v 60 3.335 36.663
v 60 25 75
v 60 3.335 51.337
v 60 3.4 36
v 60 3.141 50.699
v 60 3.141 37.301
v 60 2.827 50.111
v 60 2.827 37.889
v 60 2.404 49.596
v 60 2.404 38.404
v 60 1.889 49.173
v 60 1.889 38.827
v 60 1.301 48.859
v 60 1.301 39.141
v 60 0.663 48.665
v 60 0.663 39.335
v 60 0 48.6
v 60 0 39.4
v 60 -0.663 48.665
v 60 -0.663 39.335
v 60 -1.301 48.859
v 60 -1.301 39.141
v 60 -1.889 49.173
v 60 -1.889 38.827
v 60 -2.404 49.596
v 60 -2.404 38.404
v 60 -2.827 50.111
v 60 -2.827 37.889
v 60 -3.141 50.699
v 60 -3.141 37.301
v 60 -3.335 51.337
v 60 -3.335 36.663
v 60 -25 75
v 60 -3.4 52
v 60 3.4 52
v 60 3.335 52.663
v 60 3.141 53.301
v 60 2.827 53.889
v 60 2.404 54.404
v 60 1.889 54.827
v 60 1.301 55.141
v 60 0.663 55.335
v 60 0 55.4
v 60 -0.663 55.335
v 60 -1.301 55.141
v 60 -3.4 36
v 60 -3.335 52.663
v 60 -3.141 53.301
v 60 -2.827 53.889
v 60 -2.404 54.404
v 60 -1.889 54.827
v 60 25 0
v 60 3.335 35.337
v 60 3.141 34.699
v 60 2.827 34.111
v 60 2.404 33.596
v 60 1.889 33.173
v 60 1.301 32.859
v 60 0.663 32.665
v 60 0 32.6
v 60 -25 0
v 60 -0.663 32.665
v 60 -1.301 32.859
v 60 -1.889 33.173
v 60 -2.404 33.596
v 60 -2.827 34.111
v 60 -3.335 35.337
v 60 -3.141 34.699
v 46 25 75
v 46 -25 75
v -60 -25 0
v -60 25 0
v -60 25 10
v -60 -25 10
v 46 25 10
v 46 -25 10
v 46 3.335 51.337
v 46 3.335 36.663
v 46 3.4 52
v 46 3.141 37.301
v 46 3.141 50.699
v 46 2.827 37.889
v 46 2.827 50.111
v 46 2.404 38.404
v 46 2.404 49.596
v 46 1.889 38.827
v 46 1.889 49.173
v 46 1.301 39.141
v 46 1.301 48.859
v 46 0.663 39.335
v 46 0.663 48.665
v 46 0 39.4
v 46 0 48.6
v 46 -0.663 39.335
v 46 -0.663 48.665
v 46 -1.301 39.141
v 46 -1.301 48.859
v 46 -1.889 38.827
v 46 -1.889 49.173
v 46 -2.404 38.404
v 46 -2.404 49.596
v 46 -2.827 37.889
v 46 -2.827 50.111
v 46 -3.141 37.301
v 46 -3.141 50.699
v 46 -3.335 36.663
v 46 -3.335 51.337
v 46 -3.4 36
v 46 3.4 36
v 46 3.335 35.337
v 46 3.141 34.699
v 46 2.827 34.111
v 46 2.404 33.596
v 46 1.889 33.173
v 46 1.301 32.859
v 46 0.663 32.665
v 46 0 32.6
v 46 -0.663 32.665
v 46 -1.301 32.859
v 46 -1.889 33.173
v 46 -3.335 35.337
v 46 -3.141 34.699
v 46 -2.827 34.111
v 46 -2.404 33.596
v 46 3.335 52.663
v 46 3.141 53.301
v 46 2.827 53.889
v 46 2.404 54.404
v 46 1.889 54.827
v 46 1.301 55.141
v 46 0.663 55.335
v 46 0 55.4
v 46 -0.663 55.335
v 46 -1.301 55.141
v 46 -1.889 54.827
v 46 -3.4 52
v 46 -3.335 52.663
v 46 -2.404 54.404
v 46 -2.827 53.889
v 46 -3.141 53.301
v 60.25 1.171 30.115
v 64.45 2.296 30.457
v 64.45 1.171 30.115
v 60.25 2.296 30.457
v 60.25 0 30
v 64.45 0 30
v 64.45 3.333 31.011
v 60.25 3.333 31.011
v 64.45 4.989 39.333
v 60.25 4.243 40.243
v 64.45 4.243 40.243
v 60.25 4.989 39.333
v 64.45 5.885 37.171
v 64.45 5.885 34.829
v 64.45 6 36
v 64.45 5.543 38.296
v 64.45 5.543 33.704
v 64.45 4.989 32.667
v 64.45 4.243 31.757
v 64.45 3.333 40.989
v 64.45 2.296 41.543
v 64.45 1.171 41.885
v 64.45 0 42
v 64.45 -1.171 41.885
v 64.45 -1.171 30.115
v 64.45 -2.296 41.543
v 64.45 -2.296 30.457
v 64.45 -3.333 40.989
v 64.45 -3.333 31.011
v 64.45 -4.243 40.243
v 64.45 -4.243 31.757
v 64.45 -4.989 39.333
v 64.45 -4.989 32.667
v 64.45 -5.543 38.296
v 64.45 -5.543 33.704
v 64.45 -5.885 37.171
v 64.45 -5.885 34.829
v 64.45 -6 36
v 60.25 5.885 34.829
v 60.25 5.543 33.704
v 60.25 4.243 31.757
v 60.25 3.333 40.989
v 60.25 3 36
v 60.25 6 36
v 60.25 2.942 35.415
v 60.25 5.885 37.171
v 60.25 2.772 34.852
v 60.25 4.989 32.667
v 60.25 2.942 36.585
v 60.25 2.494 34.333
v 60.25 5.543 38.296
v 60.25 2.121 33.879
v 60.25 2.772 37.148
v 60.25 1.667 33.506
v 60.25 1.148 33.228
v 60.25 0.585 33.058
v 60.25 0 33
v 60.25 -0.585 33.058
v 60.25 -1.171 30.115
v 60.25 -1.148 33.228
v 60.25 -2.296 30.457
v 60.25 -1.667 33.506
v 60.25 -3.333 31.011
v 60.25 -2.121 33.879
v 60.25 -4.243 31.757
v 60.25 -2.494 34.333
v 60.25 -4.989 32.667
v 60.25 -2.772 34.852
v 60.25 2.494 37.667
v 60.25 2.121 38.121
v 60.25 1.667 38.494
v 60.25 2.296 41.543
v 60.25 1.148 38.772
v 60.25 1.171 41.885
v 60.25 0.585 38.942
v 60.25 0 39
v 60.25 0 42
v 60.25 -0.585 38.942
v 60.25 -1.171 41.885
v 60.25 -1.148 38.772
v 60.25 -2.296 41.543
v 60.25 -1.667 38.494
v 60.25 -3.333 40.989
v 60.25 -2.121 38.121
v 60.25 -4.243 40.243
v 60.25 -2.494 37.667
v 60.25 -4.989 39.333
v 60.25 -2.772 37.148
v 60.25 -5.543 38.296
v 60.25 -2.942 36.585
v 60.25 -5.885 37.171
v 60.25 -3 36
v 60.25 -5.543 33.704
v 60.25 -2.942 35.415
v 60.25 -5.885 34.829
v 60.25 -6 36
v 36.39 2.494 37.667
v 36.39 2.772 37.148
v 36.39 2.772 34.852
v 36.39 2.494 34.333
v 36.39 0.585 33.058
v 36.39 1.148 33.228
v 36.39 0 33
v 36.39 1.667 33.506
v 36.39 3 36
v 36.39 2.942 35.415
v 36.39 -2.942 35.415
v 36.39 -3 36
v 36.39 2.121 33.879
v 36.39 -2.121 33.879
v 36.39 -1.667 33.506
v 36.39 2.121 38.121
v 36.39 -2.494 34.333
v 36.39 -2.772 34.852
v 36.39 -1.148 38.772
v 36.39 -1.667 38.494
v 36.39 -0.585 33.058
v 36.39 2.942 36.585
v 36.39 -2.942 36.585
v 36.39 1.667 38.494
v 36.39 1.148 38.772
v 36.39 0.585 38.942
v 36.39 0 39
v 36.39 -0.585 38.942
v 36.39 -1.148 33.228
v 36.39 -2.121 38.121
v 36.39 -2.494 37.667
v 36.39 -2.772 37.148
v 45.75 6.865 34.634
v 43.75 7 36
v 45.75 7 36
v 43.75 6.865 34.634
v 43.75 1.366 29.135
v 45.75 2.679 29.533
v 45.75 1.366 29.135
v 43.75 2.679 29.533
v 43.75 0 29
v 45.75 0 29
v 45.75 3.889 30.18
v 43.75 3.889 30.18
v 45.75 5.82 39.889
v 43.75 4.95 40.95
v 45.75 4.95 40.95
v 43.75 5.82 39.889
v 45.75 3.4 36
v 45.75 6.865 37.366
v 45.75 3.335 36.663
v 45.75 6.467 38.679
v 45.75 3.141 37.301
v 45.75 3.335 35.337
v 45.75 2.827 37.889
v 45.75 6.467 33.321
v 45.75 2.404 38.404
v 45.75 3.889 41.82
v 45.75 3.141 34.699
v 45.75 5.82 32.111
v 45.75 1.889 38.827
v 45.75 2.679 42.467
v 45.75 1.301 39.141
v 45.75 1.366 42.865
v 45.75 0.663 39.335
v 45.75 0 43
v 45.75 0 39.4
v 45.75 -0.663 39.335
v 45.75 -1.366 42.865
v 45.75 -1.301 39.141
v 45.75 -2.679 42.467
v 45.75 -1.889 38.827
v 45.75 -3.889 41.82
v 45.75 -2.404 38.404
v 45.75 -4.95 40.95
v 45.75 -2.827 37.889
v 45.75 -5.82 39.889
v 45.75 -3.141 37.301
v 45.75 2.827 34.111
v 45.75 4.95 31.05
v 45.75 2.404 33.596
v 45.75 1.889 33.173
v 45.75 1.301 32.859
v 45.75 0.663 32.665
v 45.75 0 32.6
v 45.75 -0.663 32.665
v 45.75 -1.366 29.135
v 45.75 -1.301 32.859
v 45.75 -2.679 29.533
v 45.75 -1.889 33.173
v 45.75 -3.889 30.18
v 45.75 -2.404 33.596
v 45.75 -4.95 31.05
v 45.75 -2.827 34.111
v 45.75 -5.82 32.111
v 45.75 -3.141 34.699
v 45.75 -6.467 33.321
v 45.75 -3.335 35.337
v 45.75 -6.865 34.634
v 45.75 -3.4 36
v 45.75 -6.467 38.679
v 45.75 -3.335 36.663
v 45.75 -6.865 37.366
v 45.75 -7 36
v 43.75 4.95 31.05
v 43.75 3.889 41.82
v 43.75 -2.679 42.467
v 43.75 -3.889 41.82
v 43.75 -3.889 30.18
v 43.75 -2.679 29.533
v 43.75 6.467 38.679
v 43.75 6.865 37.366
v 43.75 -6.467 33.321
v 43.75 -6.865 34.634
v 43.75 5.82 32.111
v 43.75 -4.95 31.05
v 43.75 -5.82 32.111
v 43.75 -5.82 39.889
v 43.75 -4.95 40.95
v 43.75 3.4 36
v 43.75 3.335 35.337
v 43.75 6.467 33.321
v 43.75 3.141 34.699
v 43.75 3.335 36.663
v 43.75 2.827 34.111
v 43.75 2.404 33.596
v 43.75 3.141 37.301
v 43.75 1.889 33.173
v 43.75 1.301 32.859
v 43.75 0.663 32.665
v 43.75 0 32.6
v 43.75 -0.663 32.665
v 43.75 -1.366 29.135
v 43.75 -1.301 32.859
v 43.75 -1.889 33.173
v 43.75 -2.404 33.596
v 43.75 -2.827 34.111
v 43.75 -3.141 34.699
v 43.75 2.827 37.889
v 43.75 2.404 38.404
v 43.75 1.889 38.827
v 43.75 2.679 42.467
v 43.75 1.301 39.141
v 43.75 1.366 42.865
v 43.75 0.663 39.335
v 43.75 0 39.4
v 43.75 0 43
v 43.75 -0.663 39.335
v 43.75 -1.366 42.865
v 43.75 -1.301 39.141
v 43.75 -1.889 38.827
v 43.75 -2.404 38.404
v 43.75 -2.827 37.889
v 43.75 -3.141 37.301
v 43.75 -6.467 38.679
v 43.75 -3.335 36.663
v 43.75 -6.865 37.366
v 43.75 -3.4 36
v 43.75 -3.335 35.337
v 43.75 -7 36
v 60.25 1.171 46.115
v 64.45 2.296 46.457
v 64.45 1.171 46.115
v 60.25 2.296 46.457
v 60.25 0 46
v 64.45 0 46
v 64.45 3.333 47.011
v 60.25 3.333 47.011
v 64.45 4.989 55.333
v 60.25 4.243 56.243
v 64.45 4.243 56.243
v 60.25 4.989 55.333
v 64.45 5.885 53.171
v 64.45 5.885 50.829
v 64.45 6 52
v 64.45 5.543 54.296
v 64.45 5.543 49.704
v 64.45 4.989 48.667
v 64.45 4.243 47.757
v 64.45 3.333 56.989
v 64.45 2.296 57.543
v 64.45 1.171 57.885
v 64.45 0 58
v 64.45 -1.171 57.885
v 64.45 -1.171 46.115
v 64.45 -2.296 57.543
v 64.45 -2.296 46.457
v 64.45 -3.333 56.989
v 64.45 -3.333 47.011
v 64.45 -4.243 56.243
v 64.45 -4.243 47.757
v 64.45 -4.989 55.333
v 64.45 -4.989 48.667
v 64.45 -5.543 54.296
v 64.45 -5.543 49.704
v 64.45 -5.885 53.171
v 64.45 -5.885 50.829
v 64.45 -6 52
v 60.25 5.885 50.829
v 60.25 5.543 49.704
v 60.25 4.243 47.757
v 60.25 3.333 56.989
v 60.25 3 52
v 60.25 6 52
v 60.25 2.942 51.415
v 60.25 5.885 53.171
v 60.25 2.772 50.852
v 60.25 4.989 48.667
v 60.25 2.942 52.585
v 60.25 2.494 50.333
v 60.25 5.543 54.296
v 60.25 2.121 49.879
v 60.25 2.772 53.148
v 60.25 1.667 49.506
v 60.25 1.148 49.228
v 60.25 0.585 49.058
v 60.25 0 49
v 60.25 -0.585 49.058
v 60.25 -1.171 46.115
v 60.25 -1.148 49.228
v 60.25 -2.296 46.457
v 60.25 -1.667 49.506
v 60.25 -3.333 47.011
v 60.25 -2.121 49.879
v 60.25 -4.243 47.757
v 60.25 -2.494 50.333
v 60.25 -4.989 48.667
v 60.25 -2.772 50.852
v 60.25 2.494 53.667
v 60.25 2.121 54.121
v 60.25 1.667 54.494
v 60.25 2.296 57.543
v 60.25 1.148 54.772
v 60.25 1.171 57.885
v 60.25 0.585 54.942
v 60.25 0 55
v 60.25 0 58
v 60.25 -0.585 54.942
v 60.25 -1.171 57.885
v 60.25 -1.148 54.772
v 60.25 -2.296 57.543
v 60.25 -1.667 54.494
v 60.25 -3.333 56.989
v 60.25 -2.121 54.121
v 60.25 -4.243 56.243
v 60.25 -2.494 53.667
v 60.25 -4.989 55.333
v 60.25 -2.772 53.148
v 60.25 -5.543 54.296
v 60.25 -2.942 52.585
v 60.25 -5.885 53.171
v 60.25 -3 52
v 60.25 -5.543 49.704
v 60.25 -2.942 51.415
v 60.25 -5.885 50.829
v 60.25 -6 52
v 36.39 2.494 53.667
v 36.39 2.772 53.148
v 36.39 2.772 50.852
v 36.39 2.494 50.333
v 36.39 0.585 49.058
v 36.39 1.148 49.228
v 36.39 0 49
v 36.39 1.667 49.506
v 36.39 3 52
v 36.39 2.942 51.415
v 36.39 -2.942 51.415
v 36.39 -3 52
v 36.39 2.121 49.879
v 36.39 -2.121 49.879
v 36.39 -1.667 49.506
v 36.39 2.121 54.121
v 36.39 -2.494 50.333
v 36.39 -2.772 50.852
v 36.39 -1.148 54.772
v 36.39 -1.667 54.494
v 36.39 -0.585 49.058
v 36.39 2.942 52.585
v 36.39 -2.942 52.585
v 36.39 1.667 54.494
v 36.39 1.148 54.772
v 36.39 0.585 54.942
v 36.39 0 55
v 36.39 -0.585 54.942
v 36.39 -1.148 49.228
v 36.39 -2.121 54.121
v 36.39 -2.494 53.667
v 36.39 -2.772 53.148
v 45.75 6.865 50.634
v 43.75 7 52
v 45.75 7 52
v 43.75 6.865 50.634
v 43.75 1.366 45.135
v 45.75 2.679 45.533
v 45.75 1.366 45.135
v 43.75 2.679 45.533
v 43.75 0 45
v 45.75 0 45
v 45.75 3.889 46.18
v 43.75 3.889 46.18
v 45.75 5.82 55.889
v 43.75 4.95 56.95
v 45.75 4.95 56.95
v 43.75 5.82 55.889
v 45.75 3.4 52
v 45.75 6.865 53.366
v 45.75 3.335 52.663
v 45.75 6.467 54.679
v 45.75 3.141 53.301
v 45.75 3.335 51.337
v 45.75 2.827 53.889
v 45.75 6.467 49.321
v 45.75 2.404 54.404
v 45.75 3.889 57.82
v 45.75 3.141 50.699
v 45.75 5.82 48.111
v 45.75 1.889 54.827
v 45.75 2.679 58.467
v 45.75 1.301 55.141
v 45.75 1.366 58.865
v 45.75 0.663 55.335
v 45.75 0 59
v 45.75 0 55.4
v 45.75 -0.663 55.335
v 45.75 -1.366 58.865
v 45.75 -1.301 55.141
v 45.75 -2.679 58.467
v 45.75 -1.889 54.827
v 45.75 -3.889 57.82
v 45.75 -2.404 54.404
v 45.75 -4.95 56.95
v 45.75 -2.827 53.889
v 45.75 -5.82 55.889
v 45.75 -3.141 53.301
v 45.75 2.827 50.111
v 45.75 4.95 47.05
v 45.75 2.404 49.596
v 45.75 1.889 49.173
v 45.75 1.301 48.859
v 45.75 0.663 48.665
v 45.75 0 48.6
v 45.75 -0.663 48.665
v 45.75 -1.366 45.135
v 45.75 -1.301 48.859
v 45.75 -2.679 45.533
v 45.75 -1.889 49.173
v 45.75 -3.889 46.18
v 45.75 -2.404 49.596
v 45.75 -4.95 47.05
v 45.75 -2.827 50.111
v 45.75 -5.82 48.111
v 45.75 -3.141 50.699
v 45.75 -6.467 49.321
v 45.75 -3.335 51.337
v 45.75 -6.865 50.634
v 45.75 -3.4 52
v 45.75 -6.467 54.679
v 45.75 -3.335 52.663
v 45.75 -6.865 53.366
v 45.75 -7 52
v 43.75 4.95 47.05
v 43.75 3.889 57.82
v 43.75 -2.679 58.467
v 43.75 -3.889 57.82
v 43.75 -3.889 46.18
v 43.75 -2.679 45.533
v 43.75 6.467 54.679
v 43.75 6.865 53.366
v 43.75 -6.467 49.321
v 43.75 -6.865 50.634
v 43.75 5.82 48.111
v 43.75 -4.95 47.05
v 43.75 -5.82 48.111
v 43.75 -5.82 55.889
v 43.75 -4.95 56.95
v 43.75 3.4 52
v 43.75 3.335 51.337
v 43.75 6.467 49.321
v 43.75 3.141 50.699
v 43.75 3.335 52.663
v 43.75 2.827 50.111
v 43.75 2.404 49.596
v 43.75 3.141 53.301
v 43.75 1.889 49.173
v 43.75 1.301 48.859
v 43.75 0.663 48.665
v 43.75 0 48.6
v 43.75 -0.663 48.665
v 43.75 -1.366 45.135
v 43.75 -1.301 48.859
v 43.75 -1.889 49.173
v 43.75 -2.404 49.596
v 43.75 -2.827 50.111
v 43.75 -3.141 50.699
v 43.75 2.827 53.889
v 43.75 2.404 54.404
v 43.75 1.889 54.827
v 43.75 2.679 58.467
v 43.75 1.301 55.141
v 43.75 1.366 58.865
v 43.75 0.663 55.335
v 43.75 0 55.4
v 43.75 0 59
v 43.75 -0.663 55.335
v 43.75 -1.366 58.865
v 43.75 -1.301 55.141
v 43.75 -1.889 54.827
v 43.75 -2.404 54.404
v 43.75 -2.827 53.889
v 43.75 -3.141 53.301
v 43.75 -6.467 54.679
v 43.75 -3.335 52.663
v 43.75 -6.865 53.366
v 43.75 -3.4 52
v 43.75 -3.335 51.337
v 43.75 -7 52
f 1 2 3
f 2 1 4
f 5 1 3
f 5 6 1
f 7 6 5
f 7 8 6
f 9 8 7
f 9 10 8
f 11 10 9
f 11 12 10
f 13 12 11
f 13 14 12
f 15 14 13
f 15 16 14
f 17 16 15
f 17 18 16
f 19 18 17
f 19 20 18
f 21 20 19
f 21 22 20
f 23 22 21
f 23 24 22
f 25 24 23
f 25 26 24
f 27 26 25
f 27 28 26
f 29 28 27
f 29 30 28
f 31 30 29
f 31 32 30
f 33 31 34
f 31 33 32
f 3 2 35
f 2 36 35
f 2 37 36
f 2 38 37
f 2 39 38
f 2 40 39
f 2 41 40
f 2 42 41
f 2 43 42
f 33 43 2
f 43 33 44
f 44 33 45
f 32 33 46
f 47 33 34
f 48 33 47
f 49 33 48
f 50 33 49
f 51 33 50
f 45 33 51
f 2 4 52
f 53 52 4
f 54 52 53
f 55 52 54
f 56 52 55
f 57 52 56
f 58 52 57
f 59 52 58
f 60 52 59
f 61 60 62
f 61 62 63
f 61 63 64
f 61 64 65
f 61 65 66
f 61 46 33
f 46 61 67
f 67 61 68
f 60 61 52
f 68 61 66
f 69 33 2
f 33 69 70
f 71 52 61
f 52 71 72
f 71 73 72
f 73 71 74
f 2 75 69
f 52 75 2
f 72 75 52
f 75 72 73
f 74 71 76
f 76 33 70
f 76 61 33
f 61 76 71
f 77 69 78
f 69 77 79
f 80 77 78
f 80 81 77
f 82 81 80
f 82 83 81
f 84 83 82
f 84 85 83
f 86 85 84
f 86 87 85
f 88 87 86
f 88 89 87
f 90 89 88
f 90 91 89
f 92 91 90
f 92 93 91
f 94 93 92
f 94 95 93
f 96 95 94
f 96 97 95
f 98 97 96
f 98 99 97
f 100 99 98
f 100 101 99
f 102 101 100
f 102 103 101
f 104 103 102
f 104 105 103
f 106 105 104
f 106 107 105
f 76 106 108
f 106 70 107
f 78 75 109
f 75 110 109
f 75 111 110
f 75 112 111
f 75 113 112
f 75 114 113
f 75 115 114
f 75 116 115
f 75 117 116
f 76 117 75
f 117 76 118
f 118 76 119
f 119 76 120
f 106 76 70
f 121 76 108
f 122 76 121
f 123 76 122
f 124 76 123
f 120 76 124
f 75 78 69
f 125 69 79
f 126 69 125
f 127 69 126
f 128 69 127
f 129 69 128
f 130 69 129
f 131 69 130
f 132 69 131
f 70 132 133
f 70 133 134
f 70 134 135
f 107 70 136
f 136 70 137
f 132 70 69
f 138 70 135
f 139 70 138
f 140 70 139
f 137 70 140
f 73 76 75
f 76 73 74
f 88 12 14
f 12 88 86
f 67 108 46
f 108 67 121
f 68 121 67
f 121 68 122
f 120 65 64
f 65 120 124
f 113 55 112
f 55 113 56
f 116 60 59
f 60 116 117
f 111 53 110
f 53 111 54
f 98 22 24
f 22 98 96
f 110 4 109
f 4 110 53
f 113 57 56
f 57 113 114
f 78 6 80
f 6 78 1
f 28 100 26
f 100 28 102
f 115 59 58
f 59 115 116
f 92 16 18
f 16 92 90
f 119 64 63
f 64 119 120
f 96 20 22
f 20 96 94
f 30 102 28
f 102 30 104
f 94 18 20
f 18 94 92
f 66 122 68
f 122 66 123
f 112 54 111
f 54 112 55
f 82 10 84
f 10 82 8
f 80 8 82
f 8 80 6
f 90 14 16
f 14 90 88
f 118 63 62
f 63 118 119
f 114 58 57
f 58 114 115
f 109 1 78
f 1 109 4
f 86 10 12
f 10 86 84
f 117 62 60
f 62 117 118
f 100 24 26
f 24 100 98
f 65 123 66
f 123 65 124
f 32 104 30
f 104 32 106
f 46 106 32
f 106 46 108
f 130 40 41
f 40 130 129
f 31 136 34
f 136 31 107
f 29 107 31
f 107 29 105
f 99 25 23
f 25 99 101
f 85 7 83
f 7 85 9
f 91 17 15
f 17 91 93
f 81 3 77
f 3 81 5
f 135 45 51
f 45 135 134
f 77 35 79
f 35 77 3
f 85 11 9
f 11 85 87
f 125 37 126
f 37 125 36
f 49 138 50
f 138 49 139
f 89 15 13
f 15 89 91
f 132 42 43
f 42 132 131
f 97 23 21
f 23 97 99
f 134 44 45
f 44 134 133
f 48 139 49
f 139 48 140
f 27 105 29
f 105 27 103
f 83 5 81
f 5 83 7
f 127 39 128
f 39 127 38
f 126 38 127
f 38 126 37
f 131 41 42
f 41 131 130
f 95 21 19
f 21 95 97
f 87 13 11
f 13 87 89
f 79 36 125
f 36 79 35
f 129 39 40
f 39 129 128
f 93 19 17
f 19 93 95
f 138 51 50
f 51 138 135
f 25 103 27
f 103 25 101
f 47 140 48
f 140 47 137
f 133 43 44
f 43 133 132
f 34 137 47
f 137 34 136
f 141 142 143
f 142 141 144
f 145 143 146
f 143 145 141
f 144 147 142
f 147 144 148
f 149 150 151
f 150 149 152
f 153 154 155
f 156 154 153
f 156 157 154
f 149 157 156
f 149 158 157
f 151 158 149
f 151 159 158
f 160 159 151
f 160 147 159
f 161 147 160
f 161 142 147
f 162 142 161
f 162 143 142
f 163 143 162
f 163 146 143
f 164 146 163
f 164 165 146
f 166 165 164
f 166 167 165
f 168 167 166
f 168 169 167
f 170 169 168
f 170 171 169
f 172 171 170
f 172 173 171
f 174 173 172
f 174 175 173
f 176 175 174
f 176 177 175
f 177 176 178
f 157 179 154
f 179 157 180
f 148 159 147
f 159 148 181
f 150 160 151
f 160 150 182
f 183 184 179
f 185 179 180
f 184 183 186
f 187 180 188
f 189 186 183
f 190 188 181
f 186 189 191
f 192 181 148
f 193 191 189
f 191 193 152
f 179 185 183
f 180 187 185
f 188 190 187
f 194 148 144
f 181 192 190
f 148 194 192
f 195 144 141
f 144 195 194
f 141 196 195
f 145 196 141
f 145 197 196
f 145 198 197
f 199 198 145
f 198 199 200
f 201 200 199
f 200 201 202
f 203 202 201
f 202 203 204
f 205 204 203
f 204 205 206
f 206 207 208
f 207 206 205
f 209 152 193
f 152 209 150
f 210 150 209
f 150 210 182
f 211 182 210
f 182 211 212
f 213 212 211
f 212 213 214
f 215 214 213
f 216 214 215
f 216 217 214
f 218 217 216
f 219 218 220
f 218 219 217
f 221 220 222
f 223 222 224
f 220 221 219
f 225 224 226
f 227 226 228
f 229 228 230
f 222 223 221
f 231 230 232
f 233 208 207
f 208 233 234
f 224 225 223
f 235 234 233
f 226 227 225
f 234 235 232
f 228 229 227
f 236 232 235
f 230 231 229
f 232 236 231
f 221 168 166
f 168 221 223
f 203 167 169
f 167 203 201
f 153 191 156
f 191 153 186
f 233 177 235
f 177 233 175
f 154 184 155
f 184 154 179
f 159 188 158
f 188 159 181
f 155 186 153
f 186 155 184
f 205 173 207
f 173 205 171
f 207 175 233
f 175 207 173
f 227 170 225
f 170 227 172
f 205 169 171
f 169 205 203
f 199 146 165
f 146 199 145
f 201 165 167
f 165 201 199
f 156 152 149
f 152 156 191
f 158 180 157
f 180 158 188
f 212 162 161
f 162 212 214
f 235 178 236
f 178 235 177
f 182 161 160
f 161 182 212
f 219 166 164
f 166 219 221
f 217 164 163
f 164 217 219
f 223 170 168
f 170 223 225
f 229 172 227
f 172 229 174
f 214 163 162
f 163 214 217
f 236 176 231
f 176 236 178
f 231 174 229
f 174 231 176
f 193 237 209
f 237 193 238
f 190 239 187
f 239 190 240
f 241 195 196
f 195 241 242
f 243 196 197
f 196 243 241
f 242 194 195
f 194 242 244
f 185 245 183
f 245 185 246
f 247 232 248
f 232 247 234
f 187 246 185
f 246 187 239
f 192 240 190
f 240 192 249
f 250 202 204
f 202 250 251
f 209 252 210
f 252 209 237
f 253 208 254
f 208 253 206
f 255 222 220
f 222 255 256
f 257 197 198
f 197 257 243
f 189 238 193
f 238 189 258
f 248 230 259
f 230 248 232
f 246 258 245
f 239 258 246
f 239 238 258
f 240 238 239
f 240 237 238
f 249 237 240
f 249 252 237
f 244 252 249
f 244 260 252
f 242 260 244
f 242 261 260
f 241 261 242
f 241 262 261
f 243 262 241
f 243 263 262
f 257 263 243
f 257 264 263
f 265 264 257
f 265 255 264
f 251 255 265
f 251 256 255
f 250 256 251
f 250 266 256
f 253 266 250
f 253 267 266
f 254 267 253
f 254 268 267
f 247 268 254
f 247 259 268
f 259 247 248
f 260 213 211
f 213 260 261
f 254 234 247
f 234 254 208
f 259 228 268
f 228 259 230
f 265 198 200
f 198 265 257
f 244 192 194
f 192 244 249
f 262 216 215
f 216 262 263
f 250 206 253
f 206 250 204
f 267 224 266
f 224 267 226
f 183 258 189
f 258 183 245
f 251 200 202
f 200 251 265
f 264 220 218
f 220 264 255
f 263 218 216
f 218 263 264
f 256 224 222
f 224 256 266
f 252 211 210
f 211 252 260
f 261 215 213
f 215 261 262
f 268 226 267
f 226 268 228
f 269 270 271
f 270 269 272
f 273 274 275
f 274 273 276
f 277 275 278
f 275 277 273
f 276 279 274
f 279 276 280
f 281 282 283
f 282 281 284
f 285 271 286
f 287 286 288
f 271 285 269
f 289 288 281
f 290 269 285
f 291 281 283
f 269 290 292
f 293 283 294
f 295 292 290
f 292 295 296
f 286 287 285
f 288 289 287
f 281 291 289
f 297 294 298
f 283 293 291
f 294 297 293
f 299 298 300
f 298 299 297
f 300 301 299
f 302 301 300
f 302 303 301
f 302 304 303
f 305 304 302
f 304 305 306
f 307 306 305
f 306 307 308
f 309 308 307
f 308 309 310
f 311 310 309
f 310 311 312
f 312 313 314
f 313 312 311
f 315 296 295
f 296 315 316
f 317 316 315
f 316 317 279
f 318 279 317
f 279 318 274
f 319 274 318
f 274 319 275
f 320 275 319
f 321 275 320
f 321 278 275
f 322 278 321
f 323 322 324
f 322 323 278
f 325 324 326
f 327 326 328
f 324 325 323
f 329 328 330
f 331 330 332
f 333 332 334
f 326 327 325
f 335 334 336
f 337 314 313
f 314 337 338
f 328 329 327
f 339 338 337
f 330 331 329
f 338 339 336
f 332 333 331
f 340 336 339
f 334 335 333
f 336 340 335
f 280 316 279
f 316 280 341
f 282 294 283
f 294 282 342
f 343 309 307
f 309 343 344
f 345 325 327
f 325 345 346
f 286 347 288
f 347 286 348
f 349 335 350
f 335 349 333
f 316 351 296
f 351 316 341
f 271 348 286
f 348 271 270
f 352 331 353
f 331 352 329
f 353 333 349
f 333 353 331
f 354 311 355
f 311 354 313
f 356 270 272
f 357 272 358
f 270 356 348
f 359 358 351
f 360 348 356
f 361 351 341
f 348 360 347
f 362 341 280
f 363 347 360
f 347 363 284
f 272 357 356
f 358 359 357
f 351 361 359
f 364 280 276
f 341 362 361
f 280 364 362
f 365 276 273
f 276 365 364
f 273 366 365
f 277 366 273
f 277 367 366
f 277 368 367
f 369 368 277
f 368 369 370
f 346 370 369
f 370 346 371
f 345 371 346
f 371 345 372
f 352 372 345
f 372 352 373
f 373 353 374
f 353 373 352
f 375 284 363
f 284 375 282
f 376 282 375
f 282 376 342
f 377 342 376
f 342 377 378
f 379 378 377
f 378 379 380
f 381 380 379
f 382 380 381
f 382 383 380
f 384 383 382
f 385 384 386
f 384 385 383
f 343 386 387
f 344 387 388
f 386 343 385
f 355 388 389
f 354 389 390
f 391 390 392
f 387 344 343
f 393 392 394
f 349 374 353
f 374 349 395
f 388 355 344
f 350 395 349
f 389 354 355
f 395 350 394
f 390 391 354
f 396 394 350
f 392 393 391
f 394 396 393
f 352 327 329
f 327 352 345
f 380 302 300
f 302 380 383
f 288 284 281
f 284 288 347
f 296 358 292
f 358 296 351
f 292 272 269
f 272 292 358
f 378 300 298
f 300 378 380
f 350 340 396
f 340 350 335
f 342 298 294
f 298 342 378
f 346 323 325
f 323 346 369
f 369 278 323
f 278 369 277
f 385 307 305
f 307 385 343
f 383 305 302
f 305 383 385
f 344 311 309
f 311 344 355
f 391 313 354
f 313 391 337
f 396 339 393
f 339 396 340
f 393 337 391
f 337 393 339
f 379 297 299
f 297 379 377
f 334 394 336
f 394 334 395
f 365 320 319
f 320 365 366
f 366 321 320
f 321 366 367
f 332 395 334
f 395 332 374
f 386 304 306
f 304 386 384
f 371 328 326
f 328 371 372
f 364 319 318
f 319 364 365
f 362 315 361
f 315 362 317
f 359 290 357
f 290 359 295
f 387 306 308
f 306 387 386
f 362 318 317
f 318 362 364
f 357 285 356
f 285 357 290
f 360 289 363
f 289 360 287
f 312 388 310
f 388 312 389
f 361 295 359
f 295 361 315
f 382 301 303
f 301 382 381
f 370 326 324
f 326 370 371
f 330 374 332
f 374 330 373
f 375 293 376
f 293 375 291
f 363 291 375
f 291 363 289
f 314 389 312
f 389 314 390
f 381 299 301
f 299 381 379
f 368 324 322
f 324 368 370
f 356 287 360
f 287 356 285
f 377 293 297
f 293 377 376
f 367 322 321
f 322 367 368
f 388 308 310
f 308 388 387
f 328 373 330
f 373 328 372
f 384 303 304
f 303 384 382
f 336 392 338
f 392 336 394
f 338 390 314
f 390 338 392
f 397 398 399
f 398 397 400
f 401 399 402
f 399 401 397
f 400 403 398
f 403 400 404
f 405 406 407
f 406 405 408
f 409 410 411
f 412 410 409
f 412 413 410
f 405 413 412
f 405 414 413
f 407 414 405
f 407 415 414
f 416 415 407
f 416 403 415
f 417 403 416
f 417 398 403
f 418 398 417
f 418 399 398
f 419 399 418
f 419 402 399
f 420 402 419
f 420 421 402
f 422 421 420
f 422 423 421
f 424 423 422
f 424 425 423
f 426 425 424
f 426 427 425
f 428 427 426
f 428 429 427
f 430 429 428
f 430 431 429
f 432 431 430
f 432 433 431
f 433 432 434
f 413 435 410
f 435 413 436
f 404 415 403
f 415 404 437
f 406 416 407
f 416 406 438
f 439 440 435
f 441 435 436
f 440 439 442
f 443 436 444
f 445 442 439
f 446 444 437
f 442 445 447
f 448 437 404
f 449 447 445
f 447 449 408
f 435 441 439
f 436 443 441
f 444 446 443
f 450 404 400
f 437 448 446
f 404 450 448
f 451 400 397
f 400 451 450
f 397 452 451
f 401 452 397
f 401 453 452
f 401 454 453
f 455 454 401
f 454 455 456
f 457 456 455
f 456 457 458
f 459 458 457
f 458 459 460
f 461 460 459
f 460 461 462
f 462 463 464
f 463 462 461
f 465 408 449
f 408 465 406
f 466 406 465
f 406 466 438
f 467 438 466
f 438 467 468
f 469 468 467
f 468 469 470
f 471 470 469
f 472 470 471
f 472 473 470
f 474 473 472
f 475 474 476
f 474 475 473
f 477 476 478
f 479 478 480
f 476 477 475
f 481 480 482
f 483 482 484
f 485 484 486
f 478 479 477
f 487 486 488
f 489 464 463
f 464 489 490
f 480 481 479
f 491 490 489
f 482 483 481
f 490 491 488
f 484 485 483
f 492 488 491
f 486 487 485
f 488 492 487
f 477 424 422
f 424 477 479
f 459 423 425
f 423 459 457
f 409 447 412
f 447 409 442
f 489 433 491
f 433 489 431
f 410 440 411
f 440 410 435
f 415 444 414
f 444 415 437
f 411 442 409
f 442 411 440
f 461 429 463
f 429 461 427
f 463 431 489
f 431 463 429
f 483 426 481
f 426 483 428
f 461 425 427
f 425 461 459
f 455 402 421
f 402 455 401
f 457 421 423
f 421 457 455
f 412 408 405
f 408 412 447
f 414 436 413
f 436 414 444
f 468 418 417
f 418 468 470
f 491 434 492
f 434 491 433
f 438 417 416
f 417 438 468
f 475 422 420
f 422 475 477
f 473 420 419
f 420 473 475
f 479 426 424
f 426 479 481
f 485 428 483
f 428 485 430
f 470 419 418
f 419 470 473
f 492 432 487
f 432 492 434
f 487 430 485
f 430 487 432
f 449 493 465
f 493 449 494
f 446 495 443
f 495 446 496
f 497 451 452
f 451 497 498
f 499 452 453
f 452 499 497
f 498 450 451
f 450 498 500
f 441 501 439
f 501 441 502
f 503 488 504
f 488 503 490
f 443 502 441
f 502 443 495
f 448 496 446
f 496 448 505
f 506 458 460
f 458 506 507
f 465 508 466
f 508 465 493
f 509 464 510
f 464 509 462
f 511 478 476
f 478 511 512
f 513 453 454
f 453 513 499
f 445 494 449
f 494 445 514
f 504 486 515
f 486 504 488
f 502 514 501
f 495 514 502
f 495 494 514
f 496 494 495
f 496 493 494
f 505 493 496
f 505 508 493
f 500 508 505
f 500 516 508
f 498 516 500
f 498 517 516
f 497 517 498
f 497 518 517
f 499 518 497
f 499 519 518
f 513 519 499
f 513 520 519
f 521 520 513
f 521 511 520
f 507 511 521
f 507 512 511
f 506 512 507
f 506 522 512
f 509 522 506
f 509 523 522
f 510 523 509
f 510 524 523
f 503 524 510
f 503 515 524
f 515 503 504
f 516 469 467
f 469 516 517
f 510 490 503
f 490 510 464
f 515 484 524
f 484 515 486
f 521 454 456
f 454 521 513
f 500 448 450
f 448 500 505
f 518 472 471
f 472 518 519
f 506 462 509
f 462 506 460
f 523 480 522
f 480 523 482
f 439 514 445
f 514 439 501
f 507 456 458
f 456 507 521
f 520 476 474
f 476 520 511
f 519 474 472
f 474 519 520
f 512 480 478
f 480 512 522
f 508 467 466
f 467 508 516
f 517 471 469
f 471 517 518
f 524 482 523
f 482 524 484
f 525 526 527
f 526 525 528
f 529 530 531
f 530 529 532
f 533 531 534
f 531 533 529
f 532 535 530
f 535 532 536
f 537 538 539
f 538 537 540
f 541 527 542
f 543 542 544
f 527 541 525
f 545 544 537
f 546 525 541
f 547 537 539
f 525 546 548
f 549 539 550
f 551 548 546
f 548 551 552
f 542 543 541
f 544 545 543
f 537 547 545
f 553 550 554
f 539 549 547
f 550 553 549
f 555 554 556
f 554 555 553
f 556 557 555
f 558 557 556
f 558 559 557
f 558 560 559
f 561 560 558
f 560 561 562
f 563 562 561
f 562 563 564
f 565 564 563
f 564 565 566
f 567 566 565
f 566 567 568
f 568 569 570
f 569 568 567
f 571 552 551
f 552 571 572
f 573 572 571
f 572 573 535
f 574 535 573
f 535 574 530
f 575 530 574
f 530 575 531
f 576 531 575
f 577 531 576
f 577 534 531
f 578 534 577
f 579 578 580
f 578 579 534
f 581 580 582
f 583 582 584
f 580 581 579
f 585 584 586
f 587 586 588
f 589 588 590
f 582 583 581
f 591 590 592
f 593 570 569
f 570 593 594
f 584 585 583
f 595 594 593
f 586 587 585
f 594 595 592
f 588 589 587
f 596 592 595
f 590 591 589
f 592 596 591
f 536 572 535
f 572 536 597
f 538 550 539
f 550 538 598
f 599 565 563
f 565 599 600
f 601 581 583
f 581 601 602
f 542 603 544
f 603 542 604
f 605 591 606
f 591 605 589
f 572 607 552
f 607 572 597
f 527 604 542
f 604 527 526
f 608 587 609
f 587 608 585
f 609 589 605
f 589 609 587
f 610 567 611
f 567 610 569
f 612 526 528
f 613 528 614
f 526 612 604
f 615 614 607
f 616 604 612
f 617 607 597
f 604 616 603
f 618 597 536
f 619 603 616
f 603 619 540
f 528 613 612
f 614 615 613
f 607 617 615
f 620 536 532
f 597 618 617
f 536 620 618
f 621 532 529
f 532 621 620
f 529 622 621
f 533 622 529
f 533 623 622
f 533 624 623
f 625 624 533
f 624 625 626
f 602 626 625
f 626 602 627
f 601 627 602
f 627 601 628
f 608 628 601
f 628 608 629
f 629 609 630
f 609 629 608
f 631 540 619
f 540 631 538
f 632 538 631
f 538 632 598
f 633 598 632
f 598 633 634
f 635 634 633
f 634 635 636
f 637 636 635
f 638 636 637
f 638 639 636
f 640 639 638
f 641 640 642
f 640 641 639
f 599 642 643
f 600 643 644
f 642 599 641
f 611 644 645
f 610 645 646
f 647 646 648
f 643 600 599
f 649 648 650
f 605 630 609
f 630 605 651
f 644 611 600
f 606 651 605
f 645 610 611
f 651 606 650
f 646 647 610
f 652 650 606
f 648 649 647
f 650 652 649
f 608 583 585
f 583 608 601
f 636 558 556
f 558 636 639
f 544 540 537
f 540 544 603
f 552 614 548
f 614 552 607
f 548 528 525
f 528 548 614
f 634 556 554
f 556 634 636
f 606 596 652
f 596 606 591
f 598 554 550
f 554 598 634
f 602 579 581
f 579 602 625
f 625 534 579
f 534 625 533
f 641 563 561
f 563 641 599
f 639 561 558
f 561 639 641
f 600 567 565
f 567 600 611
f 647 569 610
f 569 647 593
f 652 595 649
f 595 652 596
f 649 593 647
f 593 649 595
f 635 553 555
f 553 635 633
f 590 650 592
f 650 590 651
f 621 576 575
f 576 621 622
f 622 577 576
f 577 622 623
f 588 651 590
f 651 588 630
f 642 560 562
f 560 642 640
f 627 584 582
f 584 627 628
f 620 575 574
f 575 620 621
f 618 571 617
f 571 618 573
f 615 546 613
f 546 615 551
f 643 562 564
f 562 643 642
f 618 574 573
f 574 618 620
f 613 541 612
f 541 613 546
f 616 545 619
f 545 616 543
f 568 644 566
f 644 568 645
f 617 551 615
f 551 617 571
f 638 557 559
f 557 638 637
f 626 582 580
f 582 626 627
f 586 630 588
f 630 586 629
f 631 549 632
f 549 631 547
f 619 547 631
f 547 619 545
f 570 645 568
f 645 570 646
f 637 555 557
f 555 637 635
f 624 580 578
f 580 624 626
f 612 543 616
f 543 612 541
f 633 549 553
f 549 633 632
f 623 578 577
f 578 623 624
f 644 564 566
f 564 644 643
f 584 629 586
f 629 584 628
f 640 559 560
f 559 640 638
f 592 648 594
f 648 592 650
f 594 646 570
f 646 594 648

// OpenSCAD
$fn = 32;

// ------------------------------------------------------------------------
// Bolted bracket: 120 x 50 mm bracket with 2 bolt joints
// Every part is its own module, assembly() places them once.
// ------------------------------------------------------------------------

// --- part 1 ---
module bracket() {
  difference() {
    translate([-60, -25, 0]) cube([120, 50, 75]);
    translate([-61, -26, 10]) cube([107, 52, 66]);
    translate([53, 0, 36]) rotate([0, 90, 0]) cylinder(h = 16, d = 6.8, center = true);
    translate([53, 0, 52]) rotate([0, 90, 0]) cylinder(h = 16, d = 6.8, center = true);
  }
}

// --- part 2 ---
module bolt1() {
  cylinder(h = 4.2, d = 12);
  translate([0, 0, -23.86]) cylinder(h = 23.86, d = 6);
}

// --- part 3 ---
module washer1() {
  difference() {
      translate([0, 0, 0]) cylinder(h = 2, d = 14);
      translate([0, 0, -1]) cylinder(h = 4, d = 6.8);
    }
}

// --- part 4 ---
module bolt2() {
  cylinder(h = 4.2, d = 12);
  translate([0, 0, -23.86]) cylinder(h = 23.86, d = 6);
}

// --- part 5 ---
module washer2() {
  difference() {
      translate([0, 0, 0]) cylinder(h = 2, d = 14);
      translate([0, 0, -1]) cylinder(h = 4, d = 6.8);
    }
}

// --- assembly ---
module assembly() {
  translate([0, 0, 0]) rotate([0, 0, 0]) bracket();
  translate([60.25, 0, 36]) rotate([0, 90, 0]) bolt1();
  translate([43.75, 0, 36]) rotate([0, 90, 0]) washer1();
  translate([60.25, 0, 52]) rotate([0, 90, 0]) bolt2();
  translate([43.75, 0, 52]) rotate([0, 90, 0]) washer2();
}

assembly();
